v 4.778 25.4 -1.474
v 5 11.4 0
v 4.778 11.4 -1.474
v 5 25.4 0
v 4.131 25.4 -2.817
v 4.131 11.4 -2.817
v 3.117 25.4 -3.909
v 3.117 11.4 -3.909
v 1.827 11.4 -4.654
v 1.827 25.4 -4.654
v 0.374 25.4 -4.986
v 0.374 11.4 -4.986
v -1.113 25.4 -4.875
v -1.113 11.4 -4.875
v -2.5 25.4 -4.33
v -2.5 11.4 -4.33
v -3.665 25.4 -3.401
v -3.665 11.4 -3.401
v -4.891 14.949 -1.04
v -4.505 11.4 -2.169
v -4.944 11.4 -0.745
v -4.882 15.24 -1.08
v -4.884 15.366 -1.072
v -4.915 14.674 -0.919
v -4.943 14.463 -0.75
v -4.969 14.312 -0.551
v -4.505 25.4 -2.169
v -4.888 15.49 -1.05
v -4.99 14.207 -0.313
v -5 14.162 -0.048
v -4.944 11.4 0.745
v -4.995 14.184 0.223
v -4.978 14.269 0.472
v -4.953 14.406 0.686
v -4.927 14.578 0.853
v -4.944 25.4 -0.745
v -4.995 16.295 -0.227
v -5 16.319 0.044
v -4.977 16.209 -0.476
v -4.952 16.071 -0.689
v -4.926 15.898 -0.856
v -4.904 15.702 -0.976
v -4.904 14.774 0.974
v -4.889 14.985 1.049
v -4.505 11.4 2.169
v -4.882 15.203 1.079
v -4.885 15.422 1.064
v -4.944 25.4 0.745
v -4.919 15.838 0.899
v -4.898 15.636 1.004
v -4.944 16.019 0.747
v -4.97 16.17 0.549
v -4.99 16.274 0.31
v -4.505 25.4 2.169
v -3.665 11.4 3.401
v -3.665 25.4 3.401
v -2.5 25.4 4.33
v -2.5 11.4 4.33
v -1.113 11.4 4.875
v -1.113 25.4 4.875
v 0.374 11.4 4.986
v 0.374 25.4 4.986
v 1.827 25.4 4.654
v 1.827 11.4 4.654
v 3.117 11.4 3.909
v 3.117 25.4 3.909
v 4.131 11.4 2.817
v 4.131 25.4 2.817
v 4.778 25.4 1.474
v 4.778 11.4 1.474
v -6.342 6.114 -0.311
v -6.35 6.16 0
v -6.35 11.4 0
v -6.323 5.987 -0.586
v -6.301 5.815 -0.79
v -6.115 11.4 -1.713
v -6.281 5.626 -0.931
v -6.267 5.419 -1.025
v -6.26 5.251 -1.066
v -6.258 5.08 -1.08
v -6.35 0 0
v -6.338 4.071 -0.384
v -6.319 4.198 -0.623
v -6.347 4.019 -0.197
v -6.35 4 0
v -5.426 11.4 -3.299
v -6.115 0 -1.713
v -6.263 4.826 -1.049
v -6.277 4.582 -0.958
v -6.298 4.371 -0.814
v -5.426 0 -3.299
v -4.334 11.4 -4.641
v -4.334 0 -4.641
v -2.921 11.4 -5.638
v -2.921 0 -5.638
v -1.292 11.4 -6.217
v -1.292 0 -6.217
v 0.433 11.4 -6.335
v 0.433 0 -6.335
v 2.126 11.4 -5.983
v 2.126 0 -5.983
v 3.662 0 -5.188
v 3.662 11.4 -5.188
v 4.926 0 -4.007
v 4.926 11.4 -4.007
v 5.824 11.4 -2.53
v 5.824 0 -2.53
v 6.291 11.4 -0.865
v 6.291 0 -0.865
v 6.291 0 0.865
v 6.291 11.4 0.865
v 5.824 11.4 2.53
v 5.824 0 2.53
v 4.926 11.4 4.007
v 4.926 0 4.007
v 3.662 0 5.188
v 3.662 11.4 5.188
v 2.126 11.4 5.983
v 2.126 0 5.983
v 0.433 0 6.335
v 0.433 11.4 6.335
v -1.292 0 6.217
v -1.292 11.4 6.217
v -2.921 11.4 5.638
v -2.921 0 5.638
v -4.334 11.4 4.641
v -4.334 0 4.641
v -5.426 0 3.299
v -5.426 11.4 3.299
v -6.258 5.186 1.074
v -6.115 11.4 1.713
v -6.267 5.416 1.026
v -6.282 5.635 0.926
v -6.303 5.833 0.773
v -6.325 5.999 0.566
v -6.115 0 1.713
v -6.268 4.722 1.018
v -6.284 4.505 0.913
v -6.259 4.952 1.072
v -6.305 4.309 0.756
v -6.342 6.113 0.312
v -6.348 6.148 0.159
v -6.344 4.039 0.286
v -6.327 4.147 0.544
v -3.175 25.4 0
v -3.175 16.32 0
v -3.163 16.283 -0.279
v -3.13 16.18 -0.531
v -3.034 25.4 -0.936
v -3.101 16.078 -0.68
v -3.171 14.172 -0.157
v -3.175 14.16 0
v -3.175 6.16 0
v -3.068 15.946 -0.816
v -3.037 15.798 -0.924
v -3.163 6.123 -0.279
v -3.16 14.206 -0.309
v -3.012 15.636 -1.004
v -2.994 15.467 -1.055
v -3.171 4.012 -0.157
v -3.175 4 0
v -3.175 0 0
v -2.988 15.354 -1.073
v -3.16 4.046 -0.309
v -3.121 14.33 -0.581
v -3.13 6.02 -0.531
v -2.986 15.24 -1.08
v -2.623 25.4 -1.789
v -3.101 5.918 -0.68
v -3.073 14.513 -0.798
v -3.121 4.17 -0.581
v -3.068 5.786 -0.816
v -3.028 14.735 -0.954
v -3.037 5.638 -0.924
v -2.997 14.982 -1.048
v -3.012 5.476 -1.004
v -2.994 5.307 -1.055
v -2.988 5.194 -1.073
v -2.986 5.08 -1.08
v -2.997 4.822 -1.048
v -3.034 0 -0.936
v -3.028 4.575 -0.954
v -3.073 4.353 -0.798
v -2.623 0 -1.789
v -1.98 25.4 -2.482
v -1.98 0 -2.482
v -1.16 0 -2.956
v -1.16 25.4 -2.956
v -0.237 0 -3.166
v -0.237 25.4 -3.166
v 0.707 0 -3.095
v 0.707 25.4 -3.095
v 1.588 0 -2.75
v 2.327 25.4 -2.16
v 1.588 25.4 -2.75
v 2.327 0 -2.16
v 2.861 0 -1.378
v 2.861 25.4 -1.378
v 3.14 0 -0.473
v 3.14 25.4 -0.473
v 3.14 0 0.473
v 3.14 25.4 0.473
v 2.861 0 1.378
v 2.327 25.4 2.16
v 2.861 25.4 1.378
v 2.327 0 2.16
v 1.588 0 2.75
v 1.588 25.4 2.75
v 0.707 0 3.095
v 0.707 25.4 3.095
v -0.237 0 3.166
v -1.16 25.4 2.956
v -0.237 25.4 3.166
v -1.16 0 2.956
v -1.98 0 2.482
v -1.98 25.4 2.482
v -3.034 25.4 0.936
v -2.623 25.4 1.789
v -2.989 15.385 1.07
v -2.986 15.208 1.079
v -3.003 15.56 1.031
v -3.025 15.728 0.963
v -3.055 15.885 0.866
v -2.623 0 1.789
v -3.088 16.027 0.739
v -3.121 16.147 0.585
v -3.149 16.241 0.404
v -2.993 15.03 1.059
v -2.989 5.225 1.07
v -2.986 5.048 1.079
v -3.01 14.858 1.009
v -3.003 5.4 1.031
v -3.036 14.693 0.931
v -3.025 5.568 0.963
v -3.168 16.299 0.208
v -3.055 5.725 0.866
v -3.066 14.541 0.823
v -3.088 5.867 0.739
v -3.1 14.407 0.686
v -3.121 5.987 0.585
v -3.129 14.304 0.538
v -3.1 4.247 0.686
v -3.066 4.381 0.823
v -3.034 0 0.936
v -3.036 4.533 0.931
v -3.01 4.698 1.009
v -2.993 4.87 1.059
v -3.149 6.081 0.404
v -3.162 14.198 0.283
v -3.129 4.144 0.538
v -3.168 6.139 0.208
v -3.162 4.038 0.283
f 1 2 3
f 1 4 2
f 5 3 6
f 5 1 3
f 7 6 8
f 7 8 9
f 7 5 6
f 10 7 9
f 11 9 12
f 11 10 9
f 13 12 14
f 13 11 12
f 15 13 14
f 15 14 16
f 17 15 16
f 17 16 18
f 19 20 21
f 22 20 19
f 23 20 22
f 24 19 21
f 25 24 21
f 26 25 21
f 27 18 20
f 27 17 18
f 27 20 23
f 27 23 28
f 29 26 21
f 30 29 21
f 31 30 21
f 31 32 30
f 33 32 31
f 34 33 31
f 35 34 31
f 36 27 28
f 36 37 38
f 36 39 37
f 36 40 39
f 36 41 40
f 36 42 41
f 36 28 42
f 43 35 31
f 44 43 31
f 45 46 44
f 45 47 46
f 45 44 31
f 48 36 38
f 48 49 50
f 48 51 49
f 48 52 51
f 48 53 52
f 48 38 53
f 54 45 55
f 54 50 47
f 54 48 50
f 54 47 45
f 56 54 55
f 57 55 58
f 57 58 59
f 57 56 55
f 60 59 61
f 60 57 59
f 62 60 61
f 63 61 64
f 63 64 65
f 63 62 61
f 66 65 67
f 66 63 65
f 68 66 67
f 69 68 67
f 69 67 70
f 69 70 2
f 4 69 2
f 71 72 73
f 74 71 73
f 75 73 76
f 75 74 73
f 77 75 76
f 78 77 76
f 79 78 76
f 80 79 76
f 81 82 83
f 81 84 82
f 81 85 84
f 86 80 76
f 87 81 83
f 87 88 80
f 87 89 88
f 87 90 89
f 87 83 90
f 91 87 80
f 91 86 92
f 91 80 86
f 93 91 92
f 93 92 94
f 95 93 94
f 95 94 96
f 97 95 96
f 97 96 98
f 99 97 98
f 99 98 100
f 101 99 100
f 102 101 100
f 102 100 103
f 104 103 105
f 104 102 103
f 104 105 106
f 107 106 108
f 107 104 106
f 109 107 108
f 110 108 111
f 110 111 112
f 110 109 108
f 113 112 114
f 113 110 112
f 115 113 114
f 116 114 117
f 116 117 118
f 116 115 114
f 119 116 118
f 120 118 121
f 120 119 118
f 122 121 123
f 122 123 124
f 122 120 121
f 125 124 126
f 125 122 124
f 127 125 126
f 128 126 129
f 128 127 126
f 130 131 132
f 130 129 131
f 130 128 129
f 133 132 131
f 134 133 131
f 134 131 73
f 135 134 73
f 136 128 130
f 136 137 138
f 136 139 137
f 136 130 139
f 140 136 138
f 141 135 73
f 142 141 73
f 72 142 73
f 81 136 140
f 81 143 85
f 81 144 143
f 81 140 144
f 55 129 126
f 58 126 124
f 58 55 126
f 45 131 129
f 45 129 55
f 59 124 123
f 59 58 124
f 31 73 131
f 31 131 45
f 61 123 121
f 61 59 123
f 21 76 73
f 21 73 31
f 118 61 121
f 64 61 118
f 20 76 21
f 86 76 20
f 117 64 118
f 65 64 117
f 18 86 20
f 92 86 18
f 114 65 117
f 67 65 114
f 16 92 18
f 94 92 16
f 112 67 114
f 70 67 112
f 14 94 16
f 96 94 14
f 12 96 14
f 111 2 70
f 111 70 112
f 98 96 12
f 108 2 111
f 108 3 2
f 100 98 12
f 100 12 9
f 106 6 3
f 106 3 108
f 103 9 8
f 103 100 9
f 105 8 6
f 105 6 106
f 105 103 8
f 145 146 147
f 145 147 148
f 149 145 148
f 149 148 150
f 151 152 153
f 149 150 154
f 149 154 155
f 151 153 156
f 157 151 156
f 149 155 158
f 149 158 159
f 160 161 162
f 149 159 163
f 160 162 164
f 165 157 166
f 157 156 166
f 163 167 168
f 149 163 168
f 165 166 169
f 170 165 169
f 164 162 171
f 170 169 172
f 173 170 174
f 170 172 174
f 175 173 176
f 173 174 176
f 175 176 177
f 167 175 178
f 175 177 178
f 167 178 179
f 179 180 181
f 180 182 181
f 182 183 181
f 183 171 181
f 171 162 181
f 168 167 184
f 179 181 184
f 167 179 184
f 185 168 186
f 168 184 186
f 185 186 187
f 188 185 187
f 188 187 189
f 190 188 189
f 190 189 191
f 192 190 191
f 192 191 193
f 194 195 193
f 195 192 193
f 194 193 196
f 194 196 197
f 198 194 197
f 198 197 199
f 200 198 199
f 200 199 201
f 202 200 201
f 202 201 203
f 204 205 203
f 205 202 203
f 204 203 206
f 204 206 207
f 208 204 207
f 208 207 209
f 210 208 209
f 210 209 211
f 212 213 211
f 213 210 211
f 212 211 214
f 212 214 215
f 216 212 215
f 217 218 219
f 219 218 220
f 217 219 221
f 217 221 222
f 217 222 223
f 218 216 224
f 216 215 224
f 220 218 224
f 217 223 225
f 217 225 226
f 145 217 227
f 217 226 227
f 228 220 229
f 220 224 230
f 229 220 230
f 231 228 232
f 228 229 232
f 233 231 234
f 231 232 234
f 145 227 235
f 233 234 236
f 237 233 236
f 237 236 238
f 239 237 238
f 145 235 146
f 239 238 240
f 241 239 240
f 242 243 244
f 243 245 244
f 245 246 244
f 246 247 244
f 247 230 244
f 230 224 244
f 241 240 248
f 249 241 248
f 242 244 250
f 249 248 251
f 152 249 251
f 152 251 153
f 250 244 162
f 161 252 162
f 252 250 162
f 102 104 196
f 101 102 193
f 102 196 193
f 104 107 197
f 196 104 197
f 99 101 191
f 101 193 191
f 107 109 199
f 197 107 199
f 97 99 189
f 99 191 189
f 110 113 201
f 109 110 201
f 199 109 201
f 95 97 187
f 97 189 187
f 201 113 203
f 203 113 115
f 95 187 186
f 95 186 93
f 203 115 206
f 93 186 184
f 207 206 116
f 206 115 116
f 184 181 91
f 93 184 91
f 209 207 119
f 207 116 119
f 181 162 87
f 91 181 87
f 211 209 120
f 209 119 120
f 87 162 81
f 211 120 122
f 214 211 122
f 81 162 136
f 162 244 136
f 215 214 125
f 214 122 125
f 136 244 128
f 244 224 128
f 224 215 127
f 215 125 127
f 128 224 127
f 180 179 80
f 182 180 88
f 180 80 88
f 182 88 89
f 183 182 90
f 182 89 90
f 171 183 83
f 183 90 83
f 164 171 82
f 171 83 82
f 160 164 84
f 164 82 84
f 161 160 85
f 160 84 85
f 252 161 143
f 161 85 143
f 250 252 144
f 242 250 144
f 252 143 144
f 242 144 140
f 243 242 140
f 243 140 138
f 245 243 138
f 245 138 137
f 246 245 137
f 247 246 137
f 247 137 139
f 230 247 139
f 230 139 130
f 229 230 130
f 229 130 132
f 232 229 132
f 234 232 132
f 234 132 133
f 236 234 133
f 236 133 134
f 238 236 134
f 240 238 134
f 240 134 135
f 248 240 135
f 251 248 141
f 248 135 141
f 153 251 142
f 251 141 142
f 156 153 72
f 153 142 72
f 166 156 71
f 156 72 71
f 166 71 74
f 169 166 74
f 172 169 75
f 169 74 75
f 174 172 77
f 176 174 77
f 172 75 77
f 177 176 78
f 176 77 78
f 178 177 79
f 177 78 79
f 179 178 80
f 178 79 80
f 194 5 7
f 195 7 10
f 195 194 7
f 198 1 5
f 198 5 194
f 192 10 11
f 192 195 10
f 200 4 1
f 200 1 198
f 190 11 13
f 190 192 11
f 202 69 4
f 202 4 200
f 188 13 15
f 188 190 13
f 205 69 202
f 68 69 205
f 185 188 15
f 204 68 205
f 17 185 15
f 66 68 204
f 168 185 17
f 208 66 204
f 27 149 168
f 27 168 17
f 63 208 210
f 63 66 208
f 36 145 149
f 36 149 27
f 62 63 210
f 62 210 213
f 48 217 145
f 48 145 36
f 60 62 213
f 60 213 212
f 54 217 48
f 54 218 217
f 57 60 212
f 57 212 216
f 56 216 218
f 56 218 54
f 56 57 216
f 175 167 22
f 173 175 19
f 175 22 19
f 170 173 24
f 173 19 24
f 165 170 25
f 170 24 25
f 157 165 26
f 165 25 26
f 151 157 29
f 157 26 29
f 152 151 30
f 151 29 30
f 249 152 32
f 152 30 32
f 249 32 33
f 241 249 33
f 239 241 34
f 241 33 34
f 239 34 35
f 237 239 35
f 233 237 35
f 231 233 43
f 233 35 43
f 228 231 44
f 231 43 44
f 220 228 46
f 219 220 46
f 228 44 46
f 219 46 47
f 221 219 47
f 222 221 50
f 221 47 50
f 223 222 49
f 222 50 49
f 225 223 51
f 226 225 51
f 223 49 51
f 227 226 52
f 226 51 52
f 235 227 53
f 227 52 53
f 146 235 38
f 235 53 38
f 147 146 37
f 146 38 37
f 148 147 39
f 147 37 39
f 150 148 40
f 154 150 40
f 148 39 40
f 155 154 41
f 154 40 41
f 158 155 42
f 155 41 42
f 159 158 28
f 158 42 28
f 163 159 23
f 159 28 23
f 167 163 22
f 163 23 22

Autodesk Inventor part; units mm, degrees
ref_plane "YZ Plane" through (0, 0, 0) normal (1, 0, 0) x (0, 1, 0)
ref_plane "XZ Plane" through (0, 0, 0) normal (0, 1, 0) x (-1, 0, 0)
ref_plane "XY Plane" through (0, 0, 0) normal (0, 0, 1) x (1, 0, 0)
sketch "Sketch1" plane through (0, 0, 0) normal (0, 1, 0) x (-1, 0, 0)
  circle A0 centre (0, 0) radius 6.35
  circle A1 centre (0, 0) radius 3.175
  dimension "d0" = 12.7
  dimension "d1" = 6.35
extrude "Extrusion1" add sketch "Sketch1" along normal blind 25.4
sketch "Sketch2" plane through (0, 25.4, 0) normal (0, 1, 0) x (1, 0, 0)
  circle A0 centre (0, 0) radius 6.35 projected
  circle A1 centre (0, 0) radius 5
  dimension "d4" = 10
extrude "Extrusion2" cut sketch "Sketch2" against normal blind 14
sketch "Sketch3" plane through (0, 0, 0) normal (1, 0, 0) x (0, 1, 0)
  point P0 (0, 0)
  point P1 (5.08, 0)
  point P2 (15.24, 0)
  dimension "d7" = 5.08
  dimension "d8" = 15.24
hole "Hole1" at (0, 5.08, 0) at (0, 15.24, 0) direction (-1, 0, 0) diameter 2.159 end through all
properties part number "motorCoupling"
